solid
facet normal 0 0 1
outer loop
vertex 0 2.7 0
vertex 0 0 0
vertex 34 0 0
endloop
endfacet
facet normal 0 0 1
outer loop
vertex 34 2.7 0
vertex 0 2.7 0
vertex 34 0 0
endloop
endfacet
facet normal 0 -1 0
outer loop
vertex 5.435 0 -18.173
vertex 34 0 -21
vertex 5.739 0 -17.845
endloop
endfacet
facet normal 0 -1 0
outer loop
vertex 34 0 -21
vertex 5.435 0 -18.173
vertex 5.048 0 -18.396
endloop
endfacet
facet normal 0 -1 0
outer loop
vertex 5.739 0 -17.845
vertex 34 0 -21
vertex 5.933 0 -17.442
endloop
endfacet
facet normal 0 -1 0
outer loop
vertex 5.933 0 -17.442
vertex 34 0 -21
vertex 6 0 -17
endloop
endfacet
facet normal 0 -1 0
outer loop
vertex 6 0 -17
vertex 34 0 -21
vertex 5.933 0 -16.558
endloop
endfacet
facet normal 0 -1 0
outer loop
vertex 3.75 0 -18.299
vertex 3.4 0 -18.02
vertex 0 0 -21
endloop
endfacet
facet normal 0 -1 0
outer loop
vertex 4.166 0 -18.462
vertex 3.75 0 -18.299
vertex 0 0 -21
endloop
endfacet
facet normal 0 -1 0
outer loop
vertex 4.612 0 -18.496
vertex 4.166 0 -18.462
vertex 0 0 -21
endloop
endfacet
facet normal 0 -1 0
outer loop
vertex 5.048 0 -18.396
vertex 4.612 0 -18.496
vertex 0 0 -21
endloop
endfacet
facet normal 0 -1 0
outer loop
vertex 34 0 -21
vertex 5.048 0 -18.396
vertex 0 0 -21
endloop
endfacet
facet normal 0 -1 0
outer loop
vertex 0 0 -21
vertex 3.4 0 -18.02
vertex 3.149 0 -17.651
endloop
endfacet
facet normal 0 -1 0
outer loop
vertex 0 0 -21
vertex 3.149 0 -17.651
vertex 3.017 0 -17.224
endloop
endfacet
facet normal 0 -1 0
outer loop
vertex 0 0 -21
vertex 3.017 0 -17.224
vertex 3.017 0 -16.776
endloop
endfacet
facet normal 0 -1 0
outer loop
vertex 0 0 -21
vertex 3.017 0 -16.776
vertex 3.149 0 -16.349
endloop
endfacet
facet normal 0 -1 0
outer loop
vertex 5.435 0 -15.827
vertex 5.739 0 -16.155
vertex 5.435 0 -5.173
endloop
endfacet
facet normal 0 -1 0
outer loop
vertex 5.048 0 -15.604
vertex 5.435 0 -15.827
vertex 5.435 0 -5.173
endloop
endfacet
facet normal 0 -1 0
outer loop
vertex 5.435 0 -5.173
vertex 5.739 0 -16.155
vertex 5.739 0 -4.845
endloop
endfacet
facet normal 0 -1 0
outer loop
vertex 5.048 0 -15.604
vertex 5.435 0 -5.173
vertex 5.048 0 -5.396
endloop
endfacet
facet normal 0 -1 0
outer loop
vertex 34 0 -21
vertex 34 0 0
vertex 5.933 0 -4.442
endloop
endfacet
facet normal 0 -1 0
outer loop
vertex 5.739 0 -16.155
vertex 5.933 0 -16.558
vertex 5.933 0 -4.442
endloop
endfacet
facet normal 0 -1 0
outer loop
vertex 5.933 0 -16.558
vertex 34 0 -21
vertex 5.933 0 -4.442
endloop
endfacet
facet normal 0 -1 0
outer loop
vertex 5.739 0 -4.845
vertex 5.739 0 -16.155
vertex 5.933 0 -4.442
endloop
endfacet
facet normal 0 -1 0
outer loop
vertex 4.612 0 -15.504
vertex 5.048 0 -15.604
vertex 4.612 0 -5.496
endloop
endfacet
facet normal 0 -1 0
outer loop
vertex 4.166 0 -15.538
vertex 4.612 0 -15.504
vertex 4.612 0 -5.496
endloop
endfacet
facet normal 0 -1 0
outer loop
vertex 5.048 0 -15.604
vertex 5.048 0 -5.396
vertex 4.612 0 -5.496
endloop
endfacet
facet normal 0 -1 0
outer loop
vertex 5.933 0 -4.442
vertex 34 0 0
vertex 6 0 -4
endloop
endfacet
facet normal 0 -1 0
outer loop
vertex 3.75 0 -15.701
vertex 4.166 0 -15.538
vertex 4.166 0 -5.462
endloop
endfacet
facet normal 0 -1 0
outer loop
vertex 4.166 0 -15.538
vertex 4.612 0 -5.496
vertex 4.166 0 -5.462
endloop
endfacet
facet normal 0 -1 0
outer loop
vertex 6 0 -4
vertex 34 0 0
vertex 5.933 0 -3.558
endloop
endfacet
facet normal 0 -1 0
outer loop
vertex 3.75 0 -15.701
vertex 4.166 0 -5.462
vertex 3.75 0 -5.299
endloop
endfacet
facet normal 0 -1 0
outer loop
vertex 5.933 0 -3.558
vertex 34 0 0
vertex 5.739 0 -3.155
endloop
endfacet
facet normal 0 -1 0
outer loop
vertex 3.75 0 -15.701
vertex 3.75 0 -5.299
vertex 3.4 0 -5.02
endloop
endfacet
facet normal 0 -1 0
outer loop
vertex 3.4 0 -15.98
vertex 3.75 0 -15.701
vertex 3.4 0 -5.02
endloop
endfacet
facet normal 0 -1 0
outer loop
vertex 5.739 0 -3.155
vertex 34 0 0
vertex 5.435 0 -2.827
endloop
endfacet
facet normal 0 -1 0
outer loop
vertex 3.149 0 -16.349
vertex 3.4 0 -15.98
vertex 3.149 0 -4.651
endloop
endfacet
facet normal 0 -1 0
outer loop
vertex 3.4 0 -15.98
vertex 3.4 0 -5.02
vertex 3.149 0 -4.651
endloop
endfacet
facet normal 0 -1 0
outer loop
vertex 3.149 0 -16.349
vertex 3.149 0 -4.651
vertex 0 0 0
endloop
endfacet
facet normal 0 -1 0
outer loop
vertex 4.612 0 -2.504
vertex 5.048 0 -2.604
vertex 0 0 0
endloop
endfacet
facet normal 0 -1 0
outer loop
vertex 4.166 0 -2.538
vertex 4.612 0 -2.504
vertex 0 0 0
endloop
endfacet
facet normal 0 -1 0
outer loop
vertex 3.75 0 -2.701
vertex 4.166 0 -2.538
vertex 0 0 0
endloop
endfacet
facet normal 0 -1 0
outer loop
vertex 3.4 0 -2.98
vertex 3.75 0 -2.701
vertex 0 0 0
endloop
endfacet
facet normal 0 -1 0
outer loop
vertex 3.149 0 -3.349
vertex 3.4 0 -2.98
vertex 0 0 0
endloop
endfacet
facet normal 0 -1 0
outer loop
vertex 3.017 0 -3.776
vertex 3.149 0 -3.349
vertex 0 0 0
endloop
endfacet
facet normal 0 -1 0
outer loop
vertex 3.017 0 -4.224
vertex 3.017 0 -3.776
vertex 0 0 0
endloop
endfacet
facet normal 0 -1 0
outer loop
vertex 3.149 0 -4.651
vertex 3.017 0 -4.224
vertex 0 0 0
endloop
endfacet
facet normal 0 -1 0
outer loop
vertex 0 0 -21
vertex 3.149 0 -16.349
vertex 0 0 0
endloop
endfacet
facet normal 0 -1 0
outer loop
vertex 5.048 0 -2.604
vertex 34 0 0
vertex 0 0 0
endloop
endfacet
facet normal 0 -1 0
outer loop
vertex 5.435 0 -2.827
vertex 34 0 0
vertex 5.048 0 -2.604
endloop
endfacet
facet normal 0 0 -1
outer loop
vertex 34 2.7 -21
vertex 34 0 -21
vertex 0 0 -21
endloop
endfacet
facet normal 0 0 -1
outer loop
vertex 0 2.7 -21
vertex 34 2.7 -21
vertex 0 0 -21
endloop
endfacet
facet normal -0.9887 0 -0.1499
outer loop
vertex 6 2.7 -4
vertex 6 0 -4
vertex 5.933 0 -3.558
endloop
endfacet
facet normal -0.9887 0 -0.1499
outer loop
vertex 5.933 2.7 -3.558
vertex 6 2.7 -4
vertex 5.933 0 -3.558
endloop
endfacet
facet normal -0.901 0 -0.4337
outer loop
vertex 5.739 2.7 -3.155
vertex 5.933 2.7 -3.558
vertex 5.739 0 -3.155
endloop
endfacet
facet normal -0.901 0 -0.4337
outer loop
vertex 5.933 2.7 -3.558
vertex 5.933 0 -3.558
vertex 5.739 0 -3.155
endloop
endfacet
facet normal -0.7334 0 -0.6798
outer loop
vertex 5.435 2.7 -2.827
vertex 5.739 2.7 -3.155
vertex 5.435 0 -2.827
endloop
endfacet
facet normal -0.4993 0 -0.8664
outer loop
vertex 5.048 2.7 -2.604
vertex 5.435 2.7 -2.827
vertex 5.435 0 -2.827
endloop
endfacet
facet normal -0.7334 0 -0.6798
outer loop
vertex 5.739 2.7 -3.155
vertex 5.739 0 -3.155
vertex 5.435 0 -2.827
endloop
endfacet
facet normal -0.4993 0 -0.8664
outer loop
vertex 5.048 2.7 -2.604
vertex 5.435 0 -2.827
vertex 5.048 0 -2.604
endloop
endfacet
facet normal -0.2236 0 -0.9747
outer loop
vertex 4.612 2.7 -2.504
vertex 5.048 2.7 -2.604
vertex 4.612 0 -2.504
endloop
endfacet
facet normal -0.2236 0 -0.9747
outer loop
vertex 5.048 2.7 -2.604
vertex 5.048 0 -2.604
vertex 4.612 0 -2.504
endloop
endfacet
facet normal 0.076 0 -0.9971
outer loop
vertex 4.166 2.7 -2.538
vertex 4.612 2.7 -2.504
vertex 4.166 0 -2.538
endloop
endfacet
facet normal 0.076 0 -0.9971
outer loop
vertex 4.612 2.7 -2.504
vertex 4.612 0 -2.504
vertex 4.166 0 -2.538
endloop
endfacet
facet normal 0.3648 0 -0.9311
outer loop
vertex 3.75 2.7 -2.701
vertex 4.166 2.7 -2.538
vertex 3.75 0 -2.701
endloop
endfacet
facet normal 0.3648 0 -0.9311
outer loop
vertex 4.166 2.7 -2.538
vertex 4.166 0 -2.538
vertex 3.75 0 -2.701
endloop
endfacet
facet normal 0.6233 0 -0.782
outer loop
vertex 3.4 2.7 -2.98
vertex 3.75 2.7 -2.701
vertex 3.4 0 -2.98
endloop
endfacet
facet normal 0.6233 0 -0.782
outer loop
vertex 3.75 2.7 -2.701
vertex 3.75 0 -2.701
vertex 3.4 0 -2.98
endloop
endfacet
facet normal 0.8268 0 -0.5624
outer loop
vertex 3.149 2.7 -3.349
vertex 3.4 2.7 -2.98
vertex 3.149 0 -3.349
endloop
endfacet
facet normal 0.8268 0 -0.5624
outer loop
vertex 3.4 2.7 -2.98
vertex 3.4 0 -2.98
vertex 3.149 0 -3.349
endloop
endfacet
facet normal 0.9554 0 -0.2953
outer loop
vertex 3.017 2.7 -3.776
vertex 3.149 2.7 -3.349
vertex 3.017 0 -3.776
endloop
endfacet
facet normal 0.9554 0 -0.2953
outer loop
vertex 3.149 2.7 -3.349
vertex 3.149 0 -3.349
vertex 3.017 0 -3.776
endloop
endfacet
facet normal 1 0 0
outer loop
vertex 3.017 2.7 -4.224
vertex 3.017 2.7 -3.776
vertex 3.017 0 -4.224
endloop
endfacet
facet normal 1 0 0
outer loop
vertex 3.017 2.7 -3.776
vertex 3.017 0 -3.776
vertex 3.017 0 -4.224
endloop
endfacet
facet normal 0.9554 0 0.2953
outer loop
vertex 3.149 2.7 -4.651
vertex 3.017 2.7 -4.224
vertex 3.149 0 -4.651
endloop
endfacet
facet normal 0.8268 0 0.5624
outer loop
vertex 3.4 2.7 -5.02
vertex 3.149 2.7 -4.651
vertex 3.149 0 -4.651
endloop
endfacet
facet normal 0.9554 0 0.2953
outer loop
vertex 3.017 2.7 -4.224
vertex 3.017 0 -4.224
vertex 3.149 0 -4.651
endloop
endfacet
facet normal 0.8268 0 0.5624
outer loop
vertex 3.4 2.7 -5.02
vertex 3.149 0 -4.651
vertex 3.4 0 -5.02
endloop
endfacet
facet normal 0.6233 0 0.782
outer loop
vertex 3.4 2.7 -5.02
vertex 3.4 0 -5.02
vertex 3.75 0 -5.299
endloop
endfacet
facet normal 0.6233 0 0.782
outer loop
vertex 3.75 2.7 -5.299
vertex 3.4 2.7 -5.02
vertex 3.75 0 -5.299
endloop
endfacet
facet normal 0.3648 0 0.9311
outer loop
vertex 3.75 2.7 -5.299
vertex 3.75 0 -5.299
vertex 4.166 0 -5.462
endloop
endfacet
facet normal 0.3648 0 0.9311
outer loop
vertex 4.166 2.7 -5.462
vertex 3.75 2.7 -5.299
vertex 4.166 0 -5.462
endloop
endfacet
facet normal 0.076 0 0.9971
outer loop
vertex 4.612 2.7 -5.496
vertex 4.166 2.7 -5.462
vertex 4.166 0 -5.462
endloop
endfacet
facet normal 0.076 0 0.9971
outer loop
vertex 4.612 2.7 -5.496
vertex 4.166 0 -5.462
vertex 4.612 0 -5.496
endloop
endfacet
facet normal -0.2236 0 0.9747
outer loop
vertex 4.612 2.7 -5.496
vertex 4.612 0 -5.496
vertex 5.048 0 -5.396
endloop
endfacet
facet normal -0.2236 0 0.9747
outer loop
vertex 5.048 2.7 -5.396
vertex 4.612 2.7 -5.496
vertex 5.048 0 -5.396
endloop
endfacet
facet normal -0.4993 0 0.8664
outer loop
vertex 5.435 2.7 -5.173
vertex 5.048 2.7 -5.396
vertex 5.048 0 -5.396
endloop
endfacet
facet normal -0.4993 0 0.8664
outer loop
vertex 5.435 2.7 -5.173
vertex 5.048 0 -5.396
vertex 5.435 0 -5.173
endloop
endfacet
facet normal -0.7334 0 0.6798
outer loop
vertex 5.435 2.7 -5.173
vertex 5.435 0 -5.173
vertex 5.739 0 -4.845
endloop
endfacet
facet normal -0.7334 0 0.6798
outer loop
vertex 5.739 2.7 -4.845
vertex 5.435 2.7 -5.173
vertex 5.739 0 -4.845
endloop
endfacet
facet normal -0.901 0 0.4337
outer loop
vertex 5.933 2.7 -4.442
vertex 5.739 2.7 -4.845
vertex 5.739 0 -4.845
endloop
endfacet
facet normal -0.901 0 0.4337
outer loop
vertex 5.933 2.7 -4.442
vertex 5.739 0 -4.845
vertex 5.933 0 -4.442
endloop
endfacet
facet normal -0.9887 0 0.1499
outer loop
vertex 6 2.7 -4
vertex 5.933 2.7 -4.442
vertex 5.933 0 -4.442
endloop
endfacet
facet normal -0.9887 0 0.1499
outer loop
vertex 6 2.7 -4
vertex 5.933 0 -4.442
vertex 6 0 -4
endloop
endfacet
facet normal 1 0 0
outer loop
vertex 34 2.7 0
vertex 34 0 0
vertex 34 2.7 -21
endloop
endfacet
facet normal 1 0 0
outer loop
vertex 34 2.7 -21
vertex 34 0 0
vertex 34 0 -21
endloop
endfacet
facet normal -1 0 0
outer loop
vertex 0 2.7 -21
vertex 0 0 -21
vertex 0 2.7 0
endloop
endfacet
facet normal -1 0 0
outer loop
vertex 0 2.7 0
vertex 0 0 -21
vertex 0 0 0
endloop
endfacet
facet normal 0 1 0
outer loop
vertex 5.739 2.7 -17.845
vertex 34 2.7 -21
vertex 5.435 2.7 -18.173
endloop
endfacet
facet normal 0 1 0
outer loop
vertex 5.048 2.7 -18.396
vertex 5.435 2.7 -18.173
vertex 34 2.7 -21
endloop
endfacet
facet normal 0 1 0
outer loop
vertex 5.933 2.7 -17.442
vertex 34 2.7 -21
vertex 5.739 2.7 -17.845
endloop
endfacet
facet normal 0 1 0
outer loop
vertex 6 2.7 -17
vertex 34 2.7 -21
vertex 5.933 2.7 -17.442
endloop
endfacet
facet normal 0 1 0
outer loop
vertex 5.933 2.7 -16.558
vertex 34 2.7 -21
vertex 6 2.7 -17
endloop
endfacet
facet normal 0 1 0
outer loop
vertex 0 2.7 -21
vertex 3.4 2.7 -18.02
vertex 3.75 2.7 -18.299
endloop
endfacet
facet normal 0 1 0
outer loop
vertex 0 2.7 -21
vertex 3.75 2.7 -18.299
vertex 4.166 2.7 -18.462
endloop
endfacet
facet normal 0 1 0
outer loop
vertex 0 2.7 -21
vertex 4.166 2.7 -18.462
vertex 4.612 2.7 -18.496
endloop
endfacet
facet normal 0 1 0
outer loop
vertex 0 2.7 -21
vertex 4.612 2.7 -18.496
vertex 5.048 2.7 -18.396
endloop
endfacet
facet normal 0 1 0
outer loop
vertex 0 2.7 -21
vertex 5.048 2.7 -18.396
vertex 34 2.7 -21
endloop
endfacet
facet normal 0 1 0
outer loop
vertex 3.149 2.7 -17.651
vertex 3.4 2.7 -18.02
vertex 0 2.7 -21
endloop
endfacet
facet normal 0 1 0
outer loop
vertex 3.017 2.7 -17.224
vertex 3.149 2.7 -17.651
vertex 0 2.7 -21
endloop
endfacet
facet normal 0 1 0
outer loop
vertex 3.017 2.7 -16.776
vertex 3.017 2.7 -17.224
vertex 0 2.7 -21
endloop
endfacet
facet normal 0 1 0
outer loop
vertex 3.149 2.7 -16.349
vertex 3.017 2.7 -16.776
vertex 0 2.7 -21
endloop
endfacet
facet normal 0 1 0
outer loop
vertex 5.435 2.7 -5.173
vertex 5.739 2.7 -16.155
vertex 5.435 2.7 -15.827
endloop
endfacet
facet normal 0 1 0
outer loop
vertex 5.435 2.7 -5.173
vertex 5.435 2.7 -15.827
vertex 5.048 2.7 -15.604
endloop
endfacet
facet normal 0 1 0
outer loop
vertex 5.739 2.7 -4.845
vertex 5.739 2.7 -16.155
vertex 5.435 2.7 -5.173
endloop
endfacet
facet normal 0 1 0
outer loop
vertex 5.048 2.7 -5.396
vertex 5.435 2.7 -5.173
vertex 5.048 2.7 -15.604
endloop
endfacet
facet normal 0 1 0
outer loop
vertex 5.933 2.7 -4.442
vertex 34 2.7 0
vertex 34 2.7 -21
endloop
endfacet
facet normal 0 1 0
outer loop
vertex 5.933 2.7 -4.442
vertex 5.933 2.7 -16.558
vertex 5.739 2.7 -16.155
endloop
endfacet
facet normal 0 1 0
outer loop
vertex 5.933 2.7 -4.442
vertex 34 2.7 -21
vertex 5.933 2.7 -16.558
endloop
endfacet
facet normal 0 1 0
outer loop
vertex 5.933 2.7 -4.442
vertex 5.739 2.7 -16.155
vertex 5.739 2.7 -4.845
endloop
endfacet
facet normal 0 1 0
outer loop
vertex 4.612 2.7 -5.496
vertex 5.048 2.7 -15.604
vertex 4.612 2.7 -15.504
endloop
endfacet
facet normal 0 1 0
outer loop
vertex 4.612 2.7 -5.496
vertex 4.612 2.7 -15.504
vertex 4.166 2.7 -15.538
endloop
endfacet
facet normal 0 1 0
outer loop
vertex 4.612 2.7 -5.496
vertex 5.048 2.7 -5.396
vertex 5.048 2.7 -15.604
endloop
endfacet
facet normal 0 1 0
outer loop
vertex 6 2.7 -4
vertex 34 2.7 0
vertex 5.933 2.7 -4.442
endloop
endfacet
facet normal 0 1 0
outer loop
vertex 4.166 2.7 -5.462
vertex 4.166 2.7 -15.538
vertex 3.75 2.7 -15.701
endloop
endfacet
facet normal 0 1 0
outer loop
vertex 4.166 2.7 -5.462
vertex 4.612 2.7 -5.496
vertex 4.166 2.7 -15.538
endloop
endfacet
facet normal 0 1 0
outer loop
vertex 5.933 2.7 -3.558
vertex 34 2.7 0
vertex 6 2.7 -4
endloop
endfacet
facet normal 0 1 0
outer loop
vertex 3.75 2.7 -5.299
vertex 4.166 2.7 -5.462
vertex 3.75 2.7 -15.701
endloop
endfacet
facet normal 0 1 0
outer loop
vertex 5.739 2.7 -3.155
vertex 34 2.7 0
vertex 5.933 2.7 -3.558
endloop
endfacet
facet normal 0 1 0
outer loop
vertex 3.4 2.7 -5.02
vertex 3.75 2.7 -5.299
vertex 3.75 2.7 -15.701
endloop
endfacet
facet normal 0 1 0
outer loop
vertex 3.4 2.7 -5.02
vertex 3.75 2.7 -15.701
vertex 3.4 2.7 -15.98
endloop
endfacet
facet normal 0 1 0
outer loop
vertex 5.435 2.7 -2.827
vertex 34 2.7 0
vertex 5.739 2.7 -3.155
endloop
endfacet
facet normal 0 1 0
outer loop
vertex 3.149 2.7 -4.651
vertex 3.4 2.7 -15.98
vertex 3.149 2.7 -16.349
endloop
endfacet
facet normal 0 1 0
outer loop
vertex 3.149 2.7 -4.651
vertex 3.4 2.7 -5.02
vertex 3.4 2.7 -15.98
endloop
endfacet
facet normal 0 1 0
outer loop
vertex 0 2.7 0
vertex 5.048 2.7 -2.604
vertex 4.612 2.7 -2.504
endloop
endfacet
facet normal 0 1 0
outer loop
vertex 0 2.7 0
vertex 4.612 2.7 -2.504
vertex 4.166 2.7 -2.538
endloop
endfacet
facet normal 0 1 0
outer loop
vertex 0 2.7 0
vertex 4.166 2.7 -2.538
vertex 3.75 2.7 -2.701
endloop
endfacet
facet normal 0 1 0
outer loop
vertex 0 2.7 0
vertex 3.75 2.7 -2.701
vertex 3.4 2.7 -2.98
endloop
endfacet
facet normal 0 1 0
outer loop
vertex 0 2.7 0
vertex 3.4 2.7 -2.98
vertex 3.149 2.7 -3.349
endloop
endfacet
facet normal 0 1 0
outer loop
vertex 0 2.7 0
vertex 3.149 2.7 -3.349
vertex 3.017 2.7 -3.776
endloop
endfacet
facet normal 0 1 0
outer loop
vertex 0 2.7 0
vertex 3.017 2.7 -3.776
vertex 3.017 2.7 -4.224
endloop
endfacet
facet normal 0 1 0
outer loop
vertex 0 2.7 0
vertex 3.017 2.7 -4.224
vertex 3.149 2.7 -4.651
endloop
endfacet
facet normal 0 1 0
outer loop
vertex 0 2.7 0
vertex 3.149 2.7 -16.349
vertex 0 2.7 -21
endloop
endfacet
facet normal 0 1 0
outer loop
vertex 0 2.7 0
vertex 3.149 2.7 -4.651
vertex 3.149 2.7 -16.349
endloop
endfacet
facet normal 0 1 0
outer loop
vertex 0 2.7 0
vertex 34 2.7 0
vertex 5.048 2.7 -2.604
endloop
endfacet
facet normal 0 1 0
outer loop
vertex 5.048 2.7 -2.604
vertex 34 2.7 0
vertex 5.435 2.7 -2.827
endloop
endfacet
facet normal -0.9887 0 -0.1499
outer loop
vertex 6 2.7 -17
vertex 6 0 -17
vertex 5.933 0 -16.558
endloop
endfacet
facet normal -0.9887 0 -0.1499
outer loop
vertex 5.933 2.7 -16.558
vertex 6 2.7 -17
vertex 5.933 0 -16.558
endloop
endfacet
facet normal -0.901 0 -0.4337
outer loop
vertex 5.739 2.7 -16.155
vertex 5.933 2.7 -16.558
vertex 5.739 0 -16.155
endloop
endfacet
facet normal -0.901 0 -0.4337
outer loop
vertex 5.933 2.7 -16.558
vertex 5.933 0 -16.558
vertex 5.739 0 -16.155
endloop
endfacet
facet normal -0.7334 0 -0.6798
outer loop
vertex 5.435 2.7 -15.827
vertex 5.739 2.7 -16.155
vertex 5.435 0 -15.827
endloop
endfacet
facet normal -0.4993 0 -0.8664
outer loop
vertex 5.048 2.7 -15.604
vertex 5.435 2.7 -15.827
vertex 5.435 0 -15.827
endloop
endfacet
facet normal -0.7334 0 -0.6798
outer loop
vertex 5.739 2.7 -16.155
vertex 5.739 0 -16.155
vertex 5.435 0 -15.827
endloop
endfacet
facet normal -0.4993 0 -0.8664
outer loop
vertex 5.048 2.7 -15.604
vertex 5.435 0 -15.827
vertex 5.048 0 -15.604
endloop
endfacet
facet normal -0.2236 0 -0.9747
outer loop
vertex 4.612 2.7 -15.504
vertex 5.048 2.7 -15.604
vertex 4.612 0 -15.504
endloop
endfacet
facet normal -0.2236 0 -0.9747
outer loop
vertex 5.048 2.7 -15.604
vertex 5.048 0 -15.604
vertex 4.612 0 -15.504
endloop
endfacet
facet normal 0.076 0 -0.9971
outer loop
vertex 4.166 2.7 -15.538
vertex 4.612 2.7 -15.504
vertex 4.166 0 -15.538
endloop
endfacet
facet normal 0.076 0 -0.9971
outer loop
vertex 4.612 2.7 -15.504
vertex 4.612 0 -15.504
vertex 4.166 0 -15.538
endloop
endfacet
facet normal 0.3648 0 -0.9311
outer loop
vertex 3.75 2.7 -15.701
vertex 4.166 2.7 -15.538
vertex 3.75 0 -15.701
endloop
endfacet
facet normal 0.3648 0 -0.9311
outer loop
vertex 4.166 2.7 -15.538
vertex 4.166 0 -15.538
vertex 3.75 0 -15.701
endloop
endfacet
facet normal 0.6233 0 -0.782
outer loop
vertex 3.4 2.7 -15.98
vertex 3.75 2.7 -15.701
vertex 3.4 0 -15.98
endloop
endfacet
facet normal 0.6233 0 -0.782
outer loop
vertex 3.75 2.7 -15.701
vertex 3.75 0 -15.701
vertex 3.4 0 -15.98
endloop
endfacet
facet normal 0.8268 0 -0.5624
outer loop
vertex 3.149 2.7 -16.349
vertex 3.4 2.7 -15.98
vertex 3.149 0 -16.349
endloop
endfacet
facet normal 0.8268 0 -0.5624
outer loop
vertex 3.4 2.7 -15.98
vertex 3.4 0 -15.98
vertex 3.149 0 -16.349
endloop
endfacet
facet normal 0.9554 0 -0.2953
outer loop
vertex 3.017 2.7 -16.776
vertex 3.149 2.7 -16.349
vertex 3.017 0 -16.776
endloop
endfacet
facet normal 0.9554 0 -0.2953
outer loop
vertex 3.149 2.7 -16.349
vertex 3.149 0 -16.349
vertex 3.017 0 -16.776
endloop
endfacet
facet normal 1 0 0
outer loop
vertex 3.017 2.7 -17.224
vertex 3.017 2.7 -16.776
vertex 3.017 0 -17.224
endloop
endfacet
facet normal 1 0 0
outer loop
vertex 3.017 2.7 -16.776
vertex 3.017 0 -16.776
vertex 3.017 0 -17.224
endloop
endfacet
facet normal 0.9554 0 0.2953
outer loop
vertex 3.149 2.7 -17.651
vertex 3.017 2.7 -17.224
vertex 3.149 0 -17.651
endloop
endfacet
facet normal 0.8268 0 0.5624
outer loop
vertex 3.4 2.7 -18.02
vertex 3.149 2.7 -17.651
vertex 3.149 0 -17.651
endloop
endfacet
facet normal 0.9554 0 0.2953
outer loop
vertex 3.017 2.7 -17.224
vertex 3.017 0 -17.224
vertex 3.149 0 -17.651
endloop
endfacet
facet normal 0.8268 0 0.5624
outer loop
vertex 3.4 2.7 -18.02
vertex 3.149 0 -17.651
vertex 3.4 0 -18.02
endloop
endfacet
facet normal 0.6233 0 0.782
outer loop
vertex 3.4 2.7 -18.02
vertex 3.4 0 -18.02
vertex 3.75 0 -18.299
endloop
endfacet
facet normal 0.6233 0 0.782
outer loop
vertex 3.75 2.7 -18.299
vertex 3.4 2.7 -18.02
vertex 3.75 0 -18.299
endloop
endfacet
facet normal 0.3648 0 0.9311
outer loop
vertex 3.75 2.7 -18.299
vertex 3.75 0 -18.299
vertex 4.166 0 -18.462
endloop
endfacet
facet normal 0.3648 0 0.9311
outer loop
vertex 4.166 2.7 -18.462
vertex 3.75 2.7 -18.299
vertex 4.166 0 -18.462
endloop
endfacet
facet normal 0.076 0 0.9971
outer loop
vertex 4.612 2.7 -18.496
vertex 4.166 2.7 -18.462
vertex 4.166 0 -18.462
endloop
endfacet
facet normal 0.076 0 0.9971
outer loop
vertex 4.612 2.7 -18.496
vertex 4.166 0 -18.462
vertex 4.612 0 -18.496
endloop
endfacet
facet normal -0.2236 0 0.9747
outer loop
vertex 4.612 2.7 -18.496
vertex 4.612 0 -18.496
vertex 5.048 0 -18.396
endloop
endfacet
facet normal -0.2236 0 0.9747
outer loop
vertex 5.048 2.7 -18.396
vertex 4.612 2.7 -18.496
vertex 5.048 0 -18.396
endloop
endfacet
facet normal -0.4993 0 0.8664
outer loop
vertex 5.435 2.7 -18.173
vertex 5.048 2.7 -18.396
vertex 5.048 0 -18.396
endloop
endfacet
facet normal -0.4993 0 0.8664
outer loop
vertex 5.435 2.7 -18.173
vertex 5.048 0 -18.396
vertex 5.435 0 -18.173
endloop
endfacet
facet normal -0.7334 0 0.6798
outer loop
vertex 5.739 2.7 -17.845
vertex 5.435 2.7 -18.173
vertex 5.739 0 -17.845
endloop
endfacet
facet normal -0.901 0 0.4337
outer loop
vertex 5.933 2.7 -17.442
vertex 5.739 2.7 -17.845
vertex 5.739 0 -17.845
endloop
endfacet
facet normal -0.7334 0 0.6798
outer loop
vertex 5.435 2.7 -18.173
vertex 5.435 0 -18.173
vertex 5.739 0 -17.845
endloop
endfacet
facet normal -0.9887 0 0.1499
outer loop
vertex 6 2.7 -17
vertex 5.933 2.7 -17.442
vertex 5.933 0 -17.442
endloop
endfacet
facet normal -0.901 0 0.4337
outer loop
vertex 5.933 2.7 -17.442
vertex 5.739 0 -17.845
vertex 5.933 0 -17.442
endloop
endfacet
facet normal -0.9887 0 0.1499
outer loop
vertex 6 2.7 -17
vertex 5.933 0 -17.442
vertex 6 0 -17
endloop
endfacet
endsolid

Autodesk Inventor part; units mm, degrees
ref_plane "YZ Plane" through (0, 0, 0) normal (1, 0, 0) x (0, 1, 0)
ref_plane "XZ Plane" through (0, 0, 0) normal (0, 1, 0) x (-1, 0, 0)
ref_plane "XY Plane" through (0, 0, 0) normal (0, 0, 1) x (1, 0, 0)
sketch "Sketch1" plane through (0, 0, 0) normal (0, 1, 0) x (-1, 0, 0)
  line L0 (0, 0) -> (-34, 0)
  line L1 (-34, 0) -> (-34, -21)
  line L2 (-34, -21) -> (0, -21)
  line L3 (0, -21) -> (0, 0)
  dimension "d0" = 34
  dimension "d1" = 21
extrude "Extrusion1" add sketch "Sketch1" along normal blind 2.7
sketch "Sketch2" plane through (0, 0, 0) normal (0, -1, 0) x (1, 0, 0)
  line L0 (0, 0) -> (4.5, 0)
  line L1 (0, 0) -> (34, 0) projected
  circle A0 centre (4.5, -4) radius 1.5
  line L2 (34, 0) -> (34, -21) projected
  line L3 (0, -21) -> (0, 0) projected
  circle A1 centre (4.5, -17) radius 1.5
  dimension "d4" = 4.5
  dimension "d6" = 3
extrude "Extrusion2" cut sketch "Sketch2" against normal blind 2.7
properties part number "Scheda cella di carico"
